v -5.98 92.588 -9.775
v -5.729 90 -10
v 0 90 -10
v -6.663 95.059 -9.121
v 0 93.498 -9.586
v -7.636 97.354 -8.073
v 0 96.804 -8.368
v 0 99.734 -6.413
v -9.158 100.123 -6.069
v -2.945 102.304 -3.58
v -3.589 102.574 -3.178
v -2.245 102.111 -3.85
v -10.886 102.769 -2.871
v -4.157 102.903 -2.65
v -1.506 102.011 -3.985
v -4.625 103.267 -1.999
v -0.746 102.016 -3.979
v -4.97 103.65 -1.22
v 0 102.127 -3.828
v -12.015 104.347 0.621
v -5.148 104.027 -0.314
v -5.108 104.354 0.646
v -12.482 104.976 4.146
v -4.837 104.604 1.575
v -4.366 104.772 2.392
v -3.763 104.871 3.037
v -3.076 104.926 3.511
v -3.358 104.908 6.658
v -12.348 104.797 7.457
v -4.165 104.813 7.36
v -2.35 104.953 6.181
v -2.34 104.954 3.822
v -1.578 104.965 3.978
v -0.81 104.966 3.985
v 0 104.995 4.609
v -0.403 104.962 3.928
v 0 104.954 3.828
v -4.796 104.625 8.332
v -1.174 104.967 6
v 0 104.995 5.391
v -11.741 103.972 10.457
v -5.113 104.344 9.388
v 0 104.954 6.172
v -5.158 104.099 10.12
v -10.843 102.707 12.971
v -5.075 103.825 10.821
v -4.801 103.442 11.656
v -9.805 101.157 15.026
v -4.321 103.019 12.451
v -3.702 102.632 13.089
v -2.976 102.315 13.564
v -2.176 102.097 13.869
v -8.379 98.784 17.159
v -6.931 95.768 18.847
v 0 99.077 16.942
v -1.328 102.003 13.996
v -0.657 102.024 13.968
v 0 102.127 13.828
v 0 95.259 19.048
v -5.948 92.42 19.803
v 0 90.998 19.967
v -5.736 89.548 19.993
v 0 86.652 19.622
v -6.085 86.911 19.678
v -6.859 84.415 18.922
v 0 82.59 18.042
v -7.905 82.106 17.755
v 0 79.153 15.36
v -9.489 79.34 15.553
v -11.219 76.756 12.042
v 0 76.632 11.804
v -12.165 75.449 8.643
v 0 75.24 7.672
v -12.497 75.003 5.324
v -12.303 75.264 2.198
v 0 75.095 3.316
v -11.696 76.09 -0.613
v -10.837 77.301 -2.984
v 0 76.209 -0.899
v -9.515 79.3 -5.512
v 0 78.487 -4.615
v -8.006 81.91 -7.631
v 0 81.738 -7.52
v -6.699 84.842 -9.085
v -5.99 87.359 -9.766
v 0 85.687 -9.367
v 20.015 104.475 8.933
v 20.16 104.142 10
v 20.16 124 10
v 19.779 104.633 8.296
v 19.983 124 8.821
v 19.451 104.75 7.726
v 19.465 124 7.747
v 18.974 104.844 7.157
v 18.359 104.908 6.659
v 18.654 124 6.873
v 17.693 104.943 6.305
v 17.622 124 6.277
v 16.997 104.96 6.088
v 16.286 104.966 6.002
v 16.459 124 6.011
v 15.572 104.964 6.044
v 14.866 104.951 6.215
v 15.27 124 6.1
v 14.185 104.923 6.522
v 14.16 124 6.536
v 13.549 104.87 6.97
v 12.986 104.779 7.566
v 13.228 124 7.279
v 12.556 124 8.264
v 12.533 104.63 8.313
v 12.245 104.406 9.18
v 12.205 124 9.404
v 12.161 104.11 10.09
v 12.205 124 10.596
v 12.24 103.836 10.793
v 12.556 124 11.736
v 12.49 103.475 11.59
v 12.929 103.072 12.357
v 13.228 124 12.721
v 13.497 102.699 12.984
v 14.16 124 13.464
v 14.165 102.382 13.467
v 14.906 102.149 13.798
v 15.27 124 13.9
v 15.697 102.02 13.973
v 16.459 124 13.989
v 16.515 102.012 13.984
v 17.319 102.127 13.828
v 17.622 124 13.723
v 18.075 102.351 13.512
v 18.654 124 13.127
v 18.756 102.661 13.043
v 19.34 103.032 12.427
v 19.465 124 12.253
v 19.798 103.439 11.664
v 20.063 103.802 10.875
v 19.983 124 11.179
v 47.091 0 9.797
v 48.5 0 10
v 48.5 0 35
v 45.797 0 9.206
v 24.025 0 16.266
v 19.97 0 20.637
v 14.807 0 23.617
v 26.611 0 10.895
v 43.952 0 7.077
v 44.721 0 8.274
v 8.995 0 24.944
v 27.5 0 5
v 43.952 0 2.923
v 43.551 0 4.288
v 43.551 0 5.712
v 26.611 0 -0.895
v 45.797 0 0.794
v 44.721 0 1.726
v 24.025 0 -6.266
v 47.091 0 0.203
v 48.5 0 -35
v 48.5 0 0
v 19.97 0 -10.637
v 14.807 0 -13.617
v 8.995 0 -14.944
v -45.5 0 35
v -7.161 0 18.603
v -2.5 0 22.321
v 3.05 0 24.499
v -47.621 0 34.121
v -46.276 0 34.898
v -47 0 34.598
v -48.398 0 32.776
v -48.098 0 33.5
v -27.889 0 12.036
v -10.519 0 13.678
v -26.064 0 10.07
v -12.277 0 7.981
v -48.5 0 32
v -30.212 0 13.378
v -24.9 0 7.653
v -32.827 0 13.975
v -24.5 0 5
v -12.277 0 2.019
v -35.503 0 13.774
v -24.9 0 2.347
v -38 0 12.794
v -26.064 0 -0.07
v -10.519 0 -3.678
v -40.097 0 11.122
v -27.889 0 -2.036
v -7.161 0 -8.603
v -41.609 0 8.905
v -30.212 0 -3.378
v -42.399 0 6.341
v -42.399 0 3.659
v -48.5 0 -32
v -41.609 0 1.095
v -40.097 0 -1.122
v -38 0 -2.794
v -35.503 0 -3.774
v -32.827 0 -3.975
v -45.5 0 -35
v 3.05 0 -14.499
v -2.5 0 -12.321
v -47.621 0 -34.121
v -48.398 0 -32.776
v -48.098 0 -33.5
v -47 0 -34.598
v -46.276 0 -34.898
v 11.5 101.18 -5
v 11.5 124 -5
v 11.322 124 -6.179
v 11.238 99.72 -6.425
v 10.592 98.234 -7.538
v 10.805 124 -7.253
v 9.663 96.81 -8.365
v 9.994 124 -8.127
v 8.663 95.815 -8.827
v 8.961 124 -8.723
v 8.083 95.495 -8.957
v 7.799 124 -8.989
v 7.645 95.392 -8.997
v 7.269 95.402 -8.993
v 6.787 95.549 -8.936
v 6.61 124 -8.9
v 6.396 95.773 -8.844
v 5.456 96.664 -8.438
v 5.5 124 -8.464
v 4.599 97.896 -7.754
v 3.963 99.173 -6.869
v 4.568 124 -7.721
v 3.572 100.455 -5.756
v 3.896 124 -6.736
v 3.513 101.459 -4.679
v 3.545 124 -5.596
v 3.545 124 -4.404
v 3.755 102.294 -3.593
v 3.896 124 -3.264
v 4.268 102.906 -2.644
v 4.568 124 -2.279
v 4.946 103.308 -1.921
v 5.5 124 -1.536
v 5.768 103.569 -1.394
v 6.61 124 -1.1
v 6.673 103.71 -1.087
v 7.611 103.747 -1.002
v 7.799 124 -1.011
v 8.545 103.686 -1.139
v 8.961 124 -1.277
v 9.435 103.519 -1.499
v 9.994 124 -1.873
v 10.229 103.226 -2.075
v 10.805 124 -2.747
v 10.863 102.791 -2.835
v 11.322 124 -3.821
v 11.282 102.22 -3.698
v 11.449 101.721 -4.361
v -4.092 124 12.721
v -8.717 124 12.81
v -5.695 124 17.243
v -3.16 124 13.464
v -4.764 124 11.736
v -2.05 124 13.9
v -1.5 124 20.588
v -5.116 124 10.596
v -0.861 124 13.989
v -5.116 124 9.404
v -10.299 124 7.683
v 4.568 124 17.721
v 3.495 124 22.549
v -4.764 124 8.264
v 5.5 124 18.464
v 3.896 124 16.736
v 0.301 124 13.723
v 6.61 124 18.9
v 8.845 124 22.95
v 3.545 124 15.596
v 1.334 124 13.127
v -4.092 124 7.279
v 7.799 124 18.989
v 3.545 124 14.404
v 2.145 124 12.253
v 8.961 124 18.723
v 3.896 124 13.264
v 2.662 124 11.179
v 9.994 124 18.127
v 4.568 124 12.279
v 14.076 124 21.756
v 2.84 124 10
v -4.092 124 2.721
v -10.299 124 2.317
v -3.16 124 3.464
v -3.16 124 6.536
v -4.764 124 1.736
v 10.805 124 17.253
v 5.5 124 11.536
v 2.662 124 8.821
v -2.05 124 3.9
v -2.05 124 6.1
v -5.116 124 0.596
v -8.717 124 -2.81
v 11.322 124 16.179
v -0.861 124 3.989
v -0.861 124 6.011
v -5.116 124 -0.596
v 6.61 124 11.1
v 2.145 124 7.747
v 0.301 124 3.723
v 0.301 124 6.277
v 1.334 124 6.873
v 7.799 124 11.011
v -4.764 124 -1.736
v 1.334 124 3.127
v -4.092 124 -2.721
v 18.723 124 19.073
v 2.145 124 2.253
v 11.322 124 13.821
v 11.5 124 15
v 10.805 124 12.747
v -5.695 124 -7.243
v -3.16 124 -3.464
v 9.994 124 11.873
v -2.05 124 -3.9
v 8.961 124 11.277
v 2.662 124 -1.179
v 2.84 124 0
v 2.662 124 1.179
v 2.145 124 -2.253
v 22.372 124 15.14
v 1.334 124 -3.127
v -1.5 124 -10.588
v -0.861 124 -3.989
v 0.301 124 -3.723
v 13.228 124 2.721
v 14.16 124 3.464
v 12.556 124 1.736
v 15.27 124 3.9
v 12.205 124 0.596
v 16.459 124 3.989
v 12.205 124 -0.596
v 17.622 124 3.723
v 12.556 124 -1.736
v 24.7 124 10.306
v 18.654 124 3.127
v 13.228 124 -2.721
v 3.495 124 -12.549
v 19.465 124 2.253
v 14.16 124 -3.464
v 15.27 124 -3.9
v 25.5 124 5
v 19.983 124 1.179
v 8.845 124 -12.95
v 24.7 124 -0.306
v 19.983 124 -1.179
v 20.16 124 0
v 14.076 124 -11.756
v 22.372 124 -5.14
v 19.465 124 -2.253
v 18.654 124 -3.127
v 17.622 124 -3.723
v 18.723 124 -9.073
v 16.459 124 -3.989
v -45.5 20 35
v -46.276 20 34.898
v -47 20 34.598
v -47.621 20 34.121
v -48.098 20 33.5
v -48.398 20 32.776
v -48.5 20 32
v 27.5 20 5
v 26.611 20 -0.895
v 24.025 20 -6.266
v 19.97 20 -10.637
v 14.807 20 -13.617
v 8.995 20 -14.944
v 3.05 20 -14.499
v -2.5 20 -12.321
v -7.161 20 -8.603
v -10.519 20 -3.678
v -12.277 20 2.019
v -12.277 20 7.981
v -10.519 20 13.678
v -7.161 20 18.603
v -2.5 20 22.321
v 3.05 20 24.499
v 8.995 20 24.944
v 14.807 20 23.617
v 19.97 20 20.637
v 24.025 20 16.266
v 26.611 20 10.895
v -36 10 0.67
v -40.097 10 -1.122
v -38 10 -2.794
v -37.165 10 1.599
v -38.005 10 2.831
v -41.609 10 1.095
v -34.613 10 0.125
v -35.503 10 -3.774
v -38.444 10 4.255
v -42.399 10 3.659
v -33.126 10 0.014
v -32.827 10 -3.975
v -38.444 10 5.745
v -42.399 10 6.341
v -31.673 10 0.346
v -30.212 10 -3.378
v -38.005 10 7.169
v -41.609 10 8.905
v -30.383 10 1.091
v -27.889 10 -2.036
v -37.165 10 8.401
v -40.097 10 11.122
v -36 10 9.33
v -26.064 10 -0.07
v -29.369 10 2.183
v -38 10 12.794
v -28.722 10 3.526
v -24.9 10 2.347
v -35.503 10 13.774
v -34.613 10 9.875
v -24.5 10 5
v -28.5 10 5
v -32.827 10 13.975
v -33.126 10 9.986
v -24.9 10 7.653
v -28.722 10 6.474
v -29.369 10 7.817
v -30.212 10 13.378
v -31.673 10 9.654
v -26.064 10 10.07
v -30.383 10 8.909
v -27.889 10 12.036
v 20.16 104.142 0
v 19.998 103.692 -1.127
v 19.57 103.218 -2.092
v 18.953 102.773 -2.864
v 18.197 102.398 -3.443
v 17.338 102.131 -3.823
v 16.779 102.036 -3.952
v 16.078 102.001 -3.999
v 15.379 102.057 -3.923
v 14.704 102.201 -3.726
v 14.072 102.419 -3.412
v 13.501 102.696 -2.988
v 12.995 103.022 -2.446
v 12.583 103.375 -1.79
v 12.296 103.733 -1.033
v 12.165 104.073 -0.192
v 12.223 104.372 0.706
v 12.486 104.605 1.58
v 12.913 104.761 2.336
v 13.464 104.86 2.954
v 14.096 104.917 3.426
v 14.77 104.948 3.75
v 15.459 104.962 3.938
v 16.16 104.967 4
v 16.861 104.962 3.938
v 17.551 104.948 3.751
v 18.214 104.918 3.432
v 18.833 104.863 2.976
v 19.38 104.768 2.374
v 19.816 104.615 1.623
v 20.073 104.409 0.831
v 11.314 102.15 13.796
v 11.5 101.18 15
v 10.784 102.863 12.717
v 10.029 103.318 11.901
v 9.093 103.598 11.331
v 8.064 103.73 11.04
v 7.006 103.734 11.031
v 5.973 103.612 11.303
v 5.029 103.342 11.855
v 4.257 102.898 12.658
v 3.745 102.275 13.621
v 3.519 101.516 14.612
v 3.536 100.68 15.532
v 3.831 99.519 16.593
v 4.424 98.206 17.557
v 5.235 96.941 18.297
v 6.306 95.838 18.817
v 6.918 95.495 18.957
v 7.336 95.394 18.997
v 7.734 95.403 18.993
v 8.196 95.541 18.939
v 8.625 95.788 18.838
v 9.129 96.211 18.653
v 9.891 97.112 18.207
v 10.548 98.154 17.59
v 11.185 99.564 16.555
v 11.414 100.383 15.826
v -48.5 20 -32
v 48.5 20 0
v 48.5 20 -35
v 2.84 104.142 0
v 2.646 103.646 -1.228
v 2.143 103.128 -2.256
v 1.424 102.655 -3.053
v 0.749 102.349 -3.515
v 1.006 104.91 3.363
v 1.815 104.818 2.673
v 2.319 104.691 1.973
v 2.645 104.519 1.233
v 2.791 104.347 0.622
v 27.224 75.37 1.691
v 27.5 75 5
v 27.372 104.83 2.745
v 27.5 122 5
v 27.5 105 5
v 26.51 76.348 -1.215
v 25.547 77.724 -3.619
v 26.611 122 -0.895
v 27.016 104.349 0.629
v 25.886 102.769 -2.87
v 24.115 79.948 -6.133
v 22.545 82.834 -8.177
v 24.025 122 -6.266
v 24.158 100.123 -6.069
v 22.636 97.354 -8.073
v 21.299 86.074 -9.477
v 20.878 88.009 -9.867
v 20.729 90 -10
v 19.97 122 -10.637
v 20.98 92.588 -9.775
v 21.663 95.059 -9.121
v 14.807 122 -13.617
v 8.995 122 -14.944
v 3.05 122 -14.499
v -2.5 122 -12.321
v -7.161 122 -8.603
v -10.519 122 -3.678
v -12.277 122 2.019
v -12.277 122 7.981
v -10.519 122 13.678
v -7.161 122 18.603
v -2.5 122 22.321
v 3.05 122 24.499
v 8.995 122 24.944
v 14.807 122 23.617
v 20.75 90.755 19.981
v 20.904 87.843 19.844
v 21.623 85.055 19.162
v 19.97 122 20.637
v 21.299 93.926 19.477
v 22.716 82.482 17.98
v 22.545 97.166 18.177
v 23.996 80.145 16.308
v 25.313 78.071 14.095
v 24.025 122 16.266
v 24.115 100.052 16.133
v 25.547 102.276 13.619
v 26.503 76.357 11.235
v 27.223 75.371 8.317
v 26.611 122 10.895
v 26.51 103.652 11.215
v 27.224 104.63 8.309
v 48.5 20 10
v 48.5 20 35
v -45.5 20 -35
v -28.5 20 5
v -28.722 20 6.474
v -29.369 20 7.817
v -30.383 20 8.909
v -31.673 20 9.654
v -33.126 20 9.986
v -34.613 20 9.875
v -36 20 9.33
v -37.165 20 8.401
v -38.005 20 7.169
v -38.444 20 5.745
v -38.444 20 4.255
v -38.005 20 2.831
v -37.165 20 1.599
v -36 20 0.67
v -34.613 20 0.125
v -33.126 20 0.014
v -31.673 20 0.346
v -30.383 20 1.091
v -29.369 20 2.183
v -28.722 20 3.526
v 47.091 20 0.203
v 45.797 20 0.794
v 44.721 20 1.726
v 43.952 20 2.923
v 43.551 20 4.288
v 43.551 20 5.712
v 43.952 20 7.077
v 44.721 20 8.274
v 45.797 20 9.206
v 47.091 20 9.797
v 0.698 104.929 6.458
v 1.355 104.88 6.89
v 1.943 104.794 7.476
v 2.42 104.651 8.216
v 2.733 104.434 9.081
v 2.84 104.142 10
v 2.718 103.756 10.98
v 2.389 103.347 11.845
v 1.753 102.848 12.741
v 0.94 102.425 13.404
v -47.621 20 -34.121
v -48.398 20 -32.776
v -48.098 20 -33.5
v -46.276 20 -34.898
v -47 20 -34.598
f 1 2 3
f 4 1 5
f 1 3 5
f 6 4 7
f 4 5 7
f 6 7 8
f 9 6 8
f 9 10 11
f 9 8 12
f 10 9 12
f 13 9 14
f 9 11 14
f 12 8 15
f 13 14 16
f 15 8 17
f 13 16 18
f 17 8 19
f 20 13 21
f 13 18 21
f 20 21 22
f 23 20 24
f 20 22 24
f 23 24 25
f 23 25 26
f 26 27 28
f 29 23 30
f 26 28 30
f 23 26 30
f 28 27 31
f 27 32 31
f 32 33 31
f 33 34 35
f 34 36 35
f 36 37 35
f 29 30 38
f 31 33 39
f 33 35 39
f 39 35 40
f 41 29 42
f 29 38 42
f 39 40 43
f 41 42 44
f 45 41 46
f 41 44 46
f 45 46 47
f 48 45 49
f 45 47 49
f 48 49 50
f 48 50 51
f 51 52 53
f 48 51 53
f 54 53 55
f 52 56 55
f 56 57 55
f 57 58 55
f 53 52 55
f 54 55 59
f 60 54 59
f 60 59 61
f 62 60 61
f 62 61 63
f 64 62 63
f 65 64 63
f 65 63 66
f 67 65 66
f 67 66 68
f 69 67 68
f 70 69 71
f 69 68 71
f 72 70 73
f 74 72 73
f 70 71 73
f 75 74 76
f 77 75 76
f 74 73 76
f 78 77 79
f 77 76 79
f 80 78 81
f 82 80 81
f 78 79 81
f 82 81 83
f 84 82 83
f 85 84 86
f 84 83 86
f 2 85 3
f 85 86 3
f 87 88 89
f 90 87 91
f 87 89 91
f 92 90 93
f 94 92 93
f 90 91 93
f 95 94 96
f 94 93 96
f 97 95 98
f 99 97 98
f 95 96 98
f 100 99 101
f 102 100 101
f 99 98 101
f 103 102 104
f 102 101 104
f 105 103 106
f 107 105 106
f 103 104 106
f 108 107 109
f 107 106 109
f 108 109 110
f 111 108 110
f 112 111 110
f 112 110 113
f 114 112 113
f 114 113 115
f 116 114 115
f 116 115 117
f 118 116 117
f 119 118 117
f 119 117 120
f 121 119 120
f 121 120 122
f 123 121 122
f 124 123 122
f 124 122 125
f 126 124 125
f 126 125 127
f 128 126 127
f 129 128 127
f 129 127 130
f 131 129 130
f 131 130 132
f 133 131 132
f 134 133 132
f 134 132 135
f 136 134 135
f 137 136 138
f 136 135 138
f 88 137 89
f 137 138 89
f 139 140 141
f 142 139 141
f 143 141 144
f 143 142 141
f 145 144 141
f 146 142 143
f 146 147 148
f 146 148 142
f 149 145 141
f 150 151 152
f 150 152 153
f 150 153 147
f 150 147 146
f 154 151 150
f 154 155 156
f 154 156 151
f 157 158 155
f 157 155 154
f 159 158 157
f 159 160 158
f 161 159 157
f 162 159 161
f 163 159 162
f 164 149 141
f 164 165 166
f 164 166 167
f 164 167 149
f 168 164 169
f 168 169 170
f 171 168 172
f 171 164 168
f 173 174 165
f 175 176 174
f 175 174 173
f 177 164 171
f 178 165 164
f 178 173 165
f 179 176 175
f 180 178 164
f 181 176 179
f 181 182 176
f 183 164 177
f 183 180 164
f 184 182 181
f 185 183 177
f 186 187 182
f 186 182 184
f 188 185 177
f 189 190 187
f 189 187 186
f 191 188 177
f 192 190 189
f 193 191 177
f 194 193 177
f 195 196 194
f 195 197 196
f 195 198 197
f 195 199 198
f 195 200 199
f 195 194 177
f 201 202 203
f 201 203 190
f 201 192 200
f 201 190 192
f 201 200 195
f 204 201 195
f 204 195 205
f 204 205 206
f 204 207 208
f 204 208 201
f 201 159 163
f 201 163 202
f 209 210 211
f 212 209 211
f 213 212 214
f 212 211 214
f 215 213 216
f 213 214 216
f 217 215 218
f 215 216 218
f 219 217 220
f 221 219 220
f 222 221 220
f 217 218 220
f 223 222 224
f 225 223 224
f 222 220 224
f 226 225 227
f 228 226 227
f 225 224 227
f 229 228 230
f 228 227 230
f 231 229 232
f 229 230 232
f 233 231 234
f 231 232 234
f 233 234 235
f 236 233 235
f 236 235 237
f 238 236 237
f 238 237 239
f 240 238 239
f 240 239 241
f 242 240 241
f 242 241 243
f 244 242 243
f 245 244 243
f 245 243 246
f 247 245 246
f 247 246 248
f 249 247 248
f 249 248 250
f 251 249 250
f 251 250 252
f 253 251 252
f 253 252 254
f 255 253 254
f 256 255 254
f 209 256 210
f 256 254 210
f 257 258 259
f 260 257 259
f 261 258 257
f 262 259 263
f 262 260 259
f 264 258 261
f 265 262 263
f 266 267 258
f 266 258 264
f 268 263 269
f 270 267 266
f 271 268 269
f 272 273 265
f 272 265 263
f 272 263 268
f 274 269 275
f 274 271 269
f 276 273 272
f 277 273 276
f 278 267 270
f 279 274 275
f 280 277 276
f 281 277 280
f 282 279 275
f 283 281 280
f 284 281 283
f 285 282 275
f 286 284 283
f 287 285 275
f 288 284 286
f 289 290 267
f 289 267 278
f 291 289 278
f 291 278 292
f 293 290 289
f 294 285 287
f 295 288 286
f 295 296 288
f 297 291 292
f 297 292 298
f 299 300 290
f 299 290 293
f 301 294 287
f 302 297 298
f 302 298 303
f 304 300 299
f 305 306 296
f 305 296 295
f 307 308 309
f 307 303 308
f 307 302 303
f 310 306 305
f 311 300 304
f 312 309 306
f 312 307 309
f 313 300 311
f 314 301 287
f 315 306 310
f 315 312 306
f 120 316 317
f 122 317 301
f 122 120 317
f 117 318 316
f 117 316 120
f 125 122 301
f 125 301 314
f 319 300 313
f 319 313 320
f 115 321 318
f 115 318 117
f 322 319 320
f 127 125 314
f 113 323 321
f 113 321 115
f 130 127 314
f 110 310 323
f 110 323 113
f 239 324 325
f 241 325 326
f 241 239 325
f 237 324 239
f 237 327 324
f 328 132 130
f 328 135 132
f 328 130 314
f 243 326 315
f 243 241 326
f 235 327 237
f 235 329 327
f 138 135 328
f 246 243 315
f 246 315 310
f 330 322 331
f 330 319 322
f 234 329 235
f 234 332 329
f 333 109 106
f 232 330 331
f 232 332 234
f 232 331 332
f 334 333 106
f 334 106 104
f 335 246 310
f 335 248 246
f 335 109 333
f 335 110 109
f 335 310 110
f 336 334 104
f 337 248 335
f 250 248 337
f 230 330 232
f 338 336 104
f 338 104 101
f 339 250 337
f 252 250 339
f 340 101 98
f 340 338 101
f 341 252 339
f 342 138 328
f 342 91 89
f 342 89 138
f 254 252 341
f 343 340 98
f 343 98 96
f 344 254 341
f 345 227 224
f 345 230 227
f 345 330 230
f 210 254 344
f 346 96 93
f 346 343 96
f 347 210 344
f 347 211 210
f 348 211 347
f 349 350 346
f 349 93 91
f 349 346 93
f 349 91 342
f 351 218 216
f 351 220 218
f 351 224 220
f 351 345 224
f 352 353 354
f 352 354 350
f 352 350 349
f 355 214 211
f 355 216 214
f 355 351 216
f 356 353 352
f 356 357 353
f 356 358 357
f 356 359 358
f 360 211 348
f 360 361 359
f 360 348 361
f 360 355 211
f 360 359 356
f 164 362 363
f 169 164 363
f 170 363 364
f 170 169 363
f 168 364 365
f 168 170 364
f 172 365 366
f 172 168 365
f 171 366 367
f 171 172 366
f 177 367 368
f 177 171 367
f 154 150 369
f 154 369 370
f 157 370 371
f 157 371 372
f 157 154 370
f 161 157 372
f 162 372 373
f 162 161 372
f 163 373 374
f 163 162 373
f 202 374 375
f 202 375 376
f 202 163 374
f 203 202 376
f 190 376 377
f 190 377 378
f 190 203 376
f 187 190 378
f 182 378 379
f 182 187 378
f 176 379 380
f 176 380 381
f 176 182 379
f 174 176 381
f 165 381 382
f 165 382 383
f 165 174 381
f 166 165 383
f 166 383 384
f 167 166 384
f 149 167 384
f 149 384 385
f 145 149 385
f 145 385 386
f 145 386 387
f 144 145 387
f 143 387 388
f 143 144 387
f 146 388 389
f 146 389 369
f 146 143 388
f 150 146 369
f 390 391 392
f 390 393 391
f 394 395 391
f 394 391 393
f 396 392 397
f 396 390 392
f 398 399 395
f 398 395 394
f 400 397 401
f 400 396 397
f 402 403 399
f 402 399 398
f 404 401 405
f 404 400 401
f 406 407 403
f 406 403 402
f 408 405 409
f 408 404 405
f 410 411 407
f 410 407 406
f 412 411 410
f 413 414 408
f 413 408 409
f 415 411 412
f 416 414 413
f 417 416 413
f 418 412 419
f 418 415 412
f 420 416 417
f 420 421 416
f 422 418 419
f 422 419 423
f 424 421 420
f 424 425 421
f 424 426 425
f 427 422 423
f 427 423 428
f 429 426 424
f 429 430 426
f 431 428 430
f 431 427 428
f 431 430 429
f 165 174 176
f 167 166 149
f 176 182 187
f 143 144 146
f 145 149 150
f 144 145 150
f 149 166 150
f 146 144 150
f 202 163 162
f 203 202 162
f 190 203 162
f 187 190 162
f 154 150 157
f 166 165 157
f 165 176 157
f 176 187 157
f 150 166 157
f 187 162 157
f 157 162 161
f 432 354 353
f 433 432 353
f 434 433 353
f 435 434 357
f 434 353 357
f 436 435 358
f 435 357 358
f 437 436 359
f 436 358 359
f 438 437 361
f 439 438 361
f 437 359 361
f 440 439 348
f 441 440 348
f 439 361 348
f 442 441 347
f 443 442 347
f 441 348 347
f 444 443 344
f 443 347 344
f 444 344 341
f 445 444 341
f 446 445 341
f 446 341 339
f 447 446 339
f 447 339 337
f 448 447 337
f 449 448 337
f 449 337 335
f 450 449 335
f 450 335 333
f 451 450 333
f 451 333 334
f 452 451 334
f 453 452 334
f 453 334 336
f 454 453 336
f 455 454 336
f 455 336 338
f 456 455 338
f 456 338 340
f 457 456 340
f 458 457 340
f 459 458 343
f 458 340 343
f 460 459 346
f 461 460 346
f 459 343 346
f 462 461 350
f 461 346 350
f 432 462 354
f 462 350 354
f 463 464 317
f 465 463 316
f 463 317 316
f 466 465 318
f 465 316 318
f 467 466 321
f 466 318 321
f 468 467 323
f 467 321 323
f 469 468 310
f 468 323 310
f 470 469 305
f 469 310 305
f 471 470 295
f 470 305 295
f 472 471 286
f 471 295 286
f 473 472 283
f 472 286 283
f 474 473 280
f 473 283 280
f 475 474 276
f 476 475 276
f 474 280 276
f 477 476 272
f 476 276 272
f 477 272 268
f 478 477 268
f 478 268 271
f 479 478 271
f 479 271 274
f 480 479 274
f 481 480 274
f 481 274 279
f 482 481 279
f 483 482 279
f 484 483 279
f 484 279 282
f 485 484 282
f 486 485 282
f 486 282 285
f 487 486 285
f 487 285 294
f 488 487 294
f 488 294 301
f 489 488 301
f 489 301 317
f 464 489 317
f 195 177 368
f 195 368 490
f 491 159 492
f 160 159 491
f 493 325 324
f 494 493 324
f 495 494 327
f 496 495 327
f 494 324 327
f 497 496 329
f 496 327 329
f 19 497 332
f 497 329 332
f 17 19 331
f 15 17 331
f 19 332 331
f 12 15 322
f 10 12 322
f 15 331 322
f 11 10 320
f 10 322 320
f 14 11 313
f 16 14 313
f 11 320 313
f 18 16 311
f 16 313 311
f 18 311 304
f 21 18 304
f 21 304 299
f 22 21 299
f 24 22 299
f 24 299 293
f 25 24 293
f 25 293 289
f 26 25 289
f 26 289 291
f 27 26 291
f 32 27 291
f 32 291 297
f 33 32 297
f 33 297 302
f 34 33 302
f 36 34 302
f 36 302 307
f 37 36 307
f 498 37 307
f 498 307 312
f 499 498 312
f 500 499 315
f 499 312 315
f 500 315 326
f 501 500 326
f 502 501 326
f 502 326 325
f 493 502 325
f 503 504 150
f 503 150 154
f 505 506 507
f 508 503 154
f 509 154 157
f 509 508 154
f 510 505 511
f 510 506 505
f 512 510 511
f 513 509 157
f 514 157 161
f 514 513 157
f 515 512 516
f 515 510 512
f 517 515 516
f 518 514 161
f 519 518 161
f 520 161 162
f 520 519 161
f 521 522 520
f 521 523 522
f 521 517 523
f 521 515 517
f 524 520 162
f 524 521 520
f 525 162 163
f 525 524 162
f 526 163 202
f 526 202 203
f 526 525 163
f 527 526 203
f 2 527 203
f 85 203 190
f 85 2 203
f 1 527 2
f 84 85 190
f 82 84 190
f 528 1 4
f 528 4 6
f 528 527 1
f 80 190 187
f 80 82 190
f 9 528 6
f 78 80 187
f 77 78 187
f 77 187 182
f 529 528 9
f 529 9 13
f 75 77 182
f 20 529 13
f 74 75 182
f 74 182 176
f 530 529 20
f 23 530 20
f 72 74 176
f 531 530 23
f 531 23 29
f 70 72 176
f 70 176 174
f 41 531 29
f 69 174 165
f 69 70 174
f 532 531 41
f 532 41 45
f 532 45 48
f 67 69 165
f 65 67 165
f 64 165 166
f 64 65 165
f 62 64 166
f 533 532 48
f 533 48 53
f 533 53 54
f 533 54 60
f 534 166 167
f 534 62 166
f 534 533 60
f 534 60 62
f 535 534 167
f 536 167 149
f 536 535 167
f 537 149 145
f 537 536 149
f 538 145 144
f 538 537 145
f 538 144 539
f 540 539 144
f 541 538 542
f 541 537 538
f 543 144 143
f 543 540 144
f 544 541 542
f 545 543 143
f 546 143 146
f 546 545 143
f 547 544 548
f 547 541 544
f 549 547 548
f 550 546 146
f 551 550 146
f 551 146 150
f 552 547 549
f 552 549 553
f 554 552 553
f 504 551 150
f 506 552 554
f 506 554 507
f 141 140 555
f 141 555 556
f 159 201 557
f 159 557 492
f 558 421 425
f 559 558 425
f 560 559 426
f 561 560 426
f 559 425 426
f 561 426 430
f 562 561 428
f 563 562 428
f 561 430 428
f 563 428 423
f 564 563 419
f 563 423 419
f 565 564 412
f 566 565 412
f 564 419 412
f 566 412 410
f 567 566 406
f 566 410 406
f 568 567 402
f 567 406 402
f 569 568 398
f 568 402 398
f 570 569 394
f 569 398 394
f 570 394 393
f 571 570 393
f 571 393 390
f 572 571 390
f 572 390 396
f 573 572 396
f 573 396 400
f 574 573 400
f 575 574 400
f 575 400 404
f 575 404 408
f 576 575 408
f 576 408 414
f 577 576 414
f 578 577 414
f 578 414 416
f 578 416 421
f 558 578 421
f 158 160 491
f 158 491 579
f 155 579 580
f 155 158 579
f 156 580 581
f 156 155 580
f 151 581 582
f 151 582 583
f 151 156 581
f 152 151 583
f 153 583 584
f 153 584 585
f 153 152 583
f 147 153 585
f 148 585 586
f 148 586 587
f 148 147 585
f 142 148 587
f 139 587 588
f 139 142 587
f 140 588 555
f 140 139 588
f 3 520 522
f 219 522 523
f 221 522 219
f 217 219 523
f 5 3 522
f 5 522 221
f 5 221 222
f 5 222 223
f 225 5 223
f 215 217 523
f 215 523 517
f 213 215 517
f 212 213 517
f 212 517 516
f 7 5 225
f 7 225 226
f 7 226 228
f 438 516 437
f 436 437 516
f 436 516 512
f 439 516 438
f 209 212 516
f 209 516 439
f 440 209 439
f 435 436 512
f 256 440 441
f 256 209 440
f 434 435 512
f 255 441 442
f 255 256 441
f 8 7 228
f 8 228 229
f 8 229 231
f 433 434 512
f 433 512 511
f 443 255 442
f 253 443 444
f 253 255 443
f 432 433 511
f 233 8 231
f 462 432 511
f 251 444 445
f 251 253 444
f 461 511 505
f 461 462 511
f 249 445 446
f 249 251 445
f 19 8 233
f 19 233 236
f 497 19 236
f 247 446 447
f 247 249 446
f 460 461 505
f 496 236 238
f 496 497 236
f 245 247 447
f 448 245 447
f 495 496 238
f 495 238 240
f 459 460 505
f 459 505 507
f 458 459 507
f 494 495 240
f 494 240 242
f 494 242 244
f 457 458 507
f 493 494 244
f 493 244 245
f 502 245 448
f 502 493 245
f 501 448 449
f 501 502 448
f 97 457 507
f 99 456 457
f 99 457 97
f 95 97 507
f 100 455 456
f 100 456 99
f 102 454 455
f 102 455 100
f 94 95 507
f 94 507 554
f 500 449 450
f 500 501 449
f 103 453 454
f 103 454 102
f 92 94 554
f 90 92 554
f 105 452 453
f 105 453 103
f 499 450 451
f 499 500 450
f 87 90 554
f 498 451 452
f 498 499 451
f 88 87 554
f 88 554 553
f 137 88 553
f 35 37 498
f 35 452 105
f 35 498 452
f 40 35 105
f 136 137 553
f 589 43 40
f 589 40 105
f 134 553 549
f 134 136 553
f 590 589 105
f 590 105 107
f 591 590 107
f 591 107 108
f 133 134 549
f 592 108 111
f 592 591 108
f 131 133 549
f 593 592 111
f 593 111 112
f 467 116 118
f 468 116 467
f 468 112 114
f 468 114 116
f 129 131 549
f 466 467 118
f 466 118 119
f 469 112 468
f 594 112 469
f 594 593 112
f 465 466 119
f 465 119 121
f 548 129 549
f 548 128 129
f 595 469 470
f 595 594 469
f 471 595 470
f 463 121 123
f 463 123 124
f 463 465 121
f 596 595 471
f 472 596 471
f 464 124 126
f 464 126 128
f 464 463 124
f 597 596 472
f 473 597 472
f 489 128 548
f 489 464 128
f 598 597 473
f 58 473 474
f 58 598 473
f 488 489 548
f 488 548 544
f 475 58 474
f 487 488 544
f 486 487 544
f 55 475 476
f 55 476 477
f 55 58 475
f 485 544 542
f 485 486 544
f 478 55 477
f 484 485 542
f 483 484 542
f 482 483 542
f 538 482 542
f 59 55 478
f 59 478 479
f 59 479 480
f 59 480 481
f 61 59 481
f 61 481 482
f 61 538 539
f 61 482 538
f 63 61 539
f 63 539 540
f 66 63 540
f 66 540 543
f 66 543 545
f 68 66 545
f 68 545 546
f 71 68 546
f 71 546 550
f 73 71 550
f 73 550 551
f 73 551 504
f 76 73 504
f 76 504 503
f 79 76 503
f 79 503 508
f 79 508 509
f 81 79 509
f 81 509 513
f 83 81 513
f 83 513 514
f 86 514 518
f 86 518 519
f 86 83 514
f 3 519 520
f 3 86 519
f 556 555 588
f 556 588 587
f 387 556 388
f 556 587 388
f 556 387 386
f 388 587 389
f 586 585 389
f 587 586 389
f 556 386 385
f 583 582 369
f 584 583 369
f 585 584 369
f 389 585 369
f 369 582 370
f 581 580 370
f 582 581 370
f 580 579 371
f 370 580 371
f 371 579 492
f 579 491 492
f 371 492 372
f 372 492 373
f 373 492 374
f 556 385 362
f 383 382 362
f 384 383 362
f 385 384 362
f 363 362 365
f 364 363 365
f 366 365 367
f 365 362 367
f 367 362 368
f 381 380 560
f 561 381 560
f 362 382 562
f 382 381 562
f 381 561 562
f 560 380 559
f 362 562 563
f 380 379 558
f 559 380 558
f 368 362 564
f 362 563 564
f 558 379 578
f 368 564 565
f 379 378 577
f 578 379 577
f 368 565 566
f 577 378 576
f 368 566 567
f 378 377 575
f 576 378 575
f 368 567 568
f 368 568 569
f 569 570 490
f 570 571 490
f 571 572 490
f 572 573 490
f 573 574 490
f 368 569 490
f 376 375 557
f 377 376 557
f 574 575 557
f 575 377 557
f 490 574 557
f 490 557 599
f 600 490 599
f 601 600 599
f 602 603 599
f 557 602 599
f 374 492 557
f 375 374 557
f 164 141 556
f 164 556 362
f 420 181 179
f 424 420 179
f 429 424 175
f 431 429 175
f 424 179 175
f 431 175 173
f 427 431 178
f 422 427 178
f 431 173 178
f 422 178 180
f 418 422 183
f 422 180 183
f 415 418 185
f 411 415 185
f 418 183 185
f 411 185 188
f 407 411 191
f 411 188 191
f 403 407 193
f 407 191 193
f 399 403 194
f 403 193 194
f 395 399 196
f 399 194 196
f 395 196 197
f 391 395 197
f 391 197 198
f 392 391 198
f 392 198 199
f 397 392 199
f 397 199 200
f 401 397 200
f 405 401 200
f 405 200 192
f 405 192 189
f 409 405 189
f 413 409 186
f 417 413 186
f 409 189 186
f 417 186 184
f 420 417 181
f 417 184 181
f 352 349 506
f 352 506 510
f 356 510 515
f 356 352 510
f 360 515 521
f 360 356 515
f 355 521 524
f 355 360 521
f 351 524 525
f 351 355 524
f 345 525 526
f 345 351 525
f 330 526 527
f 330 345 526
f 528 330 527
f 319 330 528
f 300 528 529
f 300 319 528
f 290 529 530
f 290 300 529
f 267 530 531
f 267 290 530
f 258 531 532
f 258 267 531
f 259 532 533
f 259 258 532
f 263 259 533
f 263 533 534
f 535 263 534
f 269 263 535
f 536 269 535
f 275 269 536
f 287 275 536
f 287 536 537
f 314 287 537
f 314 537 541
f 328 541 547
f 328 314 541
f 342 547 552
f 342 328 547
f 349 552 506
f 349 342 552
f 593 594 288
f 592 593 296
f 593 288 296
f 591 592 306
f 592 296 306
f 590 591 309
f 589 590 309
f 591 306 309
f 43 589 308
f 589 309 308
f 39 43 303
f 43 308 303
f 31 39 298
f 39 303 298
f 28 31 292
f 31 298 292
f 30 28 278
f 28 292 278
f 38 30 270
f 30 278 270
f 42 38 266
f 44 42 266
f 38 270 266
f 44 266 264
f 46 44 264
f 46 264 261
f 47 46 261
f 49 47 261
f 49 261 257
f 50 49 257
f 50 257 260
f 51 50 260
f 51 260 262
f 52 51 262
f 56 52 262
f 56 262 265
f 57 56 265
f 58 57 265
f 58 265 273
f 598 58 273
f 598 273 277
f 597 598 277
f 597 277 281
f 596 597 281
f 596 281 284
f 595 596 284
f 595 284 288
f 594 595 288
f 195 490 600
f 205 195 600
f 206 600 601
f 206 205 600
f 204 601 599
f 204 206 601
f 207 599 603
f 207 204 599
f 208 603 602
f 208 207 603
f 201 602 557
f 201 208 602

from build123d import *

# Parameters (mm, degrees)
SKETCH1_R                = 20
BOSS_EXTRUDE1_DEPTH      = 20
SKETCH2_R                = 5
CUT_EXTRUDE1_DEPTH       = 21
SKETCH3_R                = 9
CUT_EXTRUDE2_DEPTH       = 10
SKETCH4_R                = 20
BOSS_EXTRUDE2_DEPTH      = 104
BOSS_EXTRUDE2_DEPTH_BACK = 20
SKETCH5_R                = 15
CUT_EXTRUDE3_DEPTH       = 49.5
CUT_EXTRUDE3_DEPTH_BACK  = 49.5
CHAMFER1_SIZE            = 2
CUT_EXTRUDE4_REACH       = 126
SKETCH6_R                = 4


with BuildPart() as part:
    # Sketch1 → Boss-Extrude1 (new body)
    with BuildSketch(Plane(origin=(0, 0, 0), x_dir=(1, 0, 0), z_dir=(0, 1, 0))):
        with BuildLine():
            Line((-45.5, 35), (48.5, 35))
            Line((48.5, 35), (48.5, 0))
            ThreePointArc((48.5, 0), (43.5, -5), (48.5, -10))
            Line((48.5, -10), (48.5, -35))
            Line((48.5, -35), (-45.5, -35))
            ThreePointArc((-45.5, -35), (-47.621320344, -34.121320344), (-48.5, -32))
            Line((-48.5, -32), (-48.5, 32))
            ThreePointArc((-48.5, 32), (-47.621320344, 34.121320344), (-45.5, 35))
        make_face()
        with Locations((7.5, -5)):
            Circle(SKETCH1_R, mode=Mode.SUBTRACT)
    extrude(amount=BOSS_EXTRUDE1_DEPTH)

    # Sketch2 → Cut-Extrude1 (cut, through all)
    with BuildSketch(Plane.XZ):
        with Locations((-33.5, 5)):
            Circle(SKETCH2_R)
    extrude(amount=-CUT_EXTRUDE1_DEPTH, mode=Mode.SUBTRACT)

    # Sketch3 → Cut-Extrude2 (cut)
    with BuildSketch(Plane.XZ):
        with Locations((-33.5, 5)):
            Circle(SKETCH3_R)
    extrude(amount=-CUT_EXTRUDE2_DEPTH, mode=Mode.SUBTRACT)


with BuildPart() as body_2:
    # Sketch4 → Boss-Extrude2 (new body, two sides)
    with BuildSketch(Plane(origin=(0, 20, 0), x_dir=(1, 0, 0), z_dir=(0, 1, 0))) as boss_extrude2_sk:
        with Locations((7.5, -5)):
            Circle(SKETCH4_R)
    extrude(amount=BOSS_EXTRUDE2_DEPTH)
    extrude(boss_extrude2_sk.sketch, amount=-BOSS_EXTRUDE2_DEPTH_BACK)

    # Sketch5 → Cut-Extrude3 (cut, two sides)
    with BuildSketch(Plane(origin=(0, 0, 0), x_dir=(0, 0, -1), z_dir=(1, 0, 0))) as cut_extrude3_sk:
        with Locations((-5, 90)):
            Circle(SKETCH5_R)
    extrude(amount=CUT_EXTRUDE3_DEPTH, mode=Mode.SUBTRACT)
    extrude(cut_extrude3_sk.sketch, amount=-CUT_EXTRUDE3_DEPTH_BACK, mode=Mode.SUBTRACT)

    # Chamfer1
    chamfer1_edges = [body_2.edges().sort_by_distance(p)[0] for p in [
        (-12.5, 124, 5),
    ]]
    chamfer(chamfer1_edges, length=CHAMFER1_SIZE)

    # Sketch6 → Cut-Extrude4 (cut, up to next)
    with BuildSketch(Plane(origin=(0, 124, 0), x_dir=(1, 0, 0), z_dir=(0, 1, 0)), mode=Mode.PRIVATE) as cut_extrude4_sk1:
        with Locations((7.5, 5)):
            Circle(SKETCH6_R)
    cut_extrude4_tool1 = extrude(cut_extrude4_sk1.sketch, amount=-CUT_EXTRUDE4_REACH, mode=Mode.PRIVATE) & body_2.part
    add(cut_extrude4_tool1.solids().sort_by_distance((7.5, 124, -5))[0], mode=Mode.SUBTRACT)
    # Sketch6 → Cut-Extrude4 (cut, up to next)
    with BuildSketch(Plane(origin=(0, 124, 0), x_dir=(1, 0, 0), z_dir=(0, 1, 0)), mode=Mode.PRIVATE) as cut_extrude4_sk2:
        with Locations((16.160254038, 0)):
            Circle(SKETCH6_R)
    cut_extrude4_tool2 = extrude(cut_extrude4_sk2.sketch, amount=-CUT_EXTRUDE4_REACH, mode=Mode.PRIVATE) & body_2.part
    add(cut_extrude4_tool2.solids().sort_by_distance((16.160254, 124, 0))[0], mode=Mode.SUBTRACT)
    # Sketch6 → Cut-Extrude4 (cut, up to next)
    with BuildSketch(Plane(origin=(0, 124, 0), x_dir=(1, 0, 0), z_dir=(0, 1, 0)), mode=Mode.PRIVATE) as cut_extrude4_sk3:
        with Locations((16.160254038, -10)):
            Circle(SKETCH6_R)
    cut_extrude4_tool3 = extrude(cut_extrude4_sk3.sketch, amount=-CUT_EXTRUDE4_REACH, mode=Mode.PRIVATE) & body_2.part
    add(cut_extrude4_tool3.solids().sort_by_distance((16.160254, 124, 10))[0], mode=Mode.SUBTRACT)
    # Sketch6 → Cut-Extrude4 (cut, up to next)
    with BuildSketch(Plane(origin=(0, 124, 0), x_dir=(1, 0, 0), z_dir=(0, 1, 0)), mode=Mode.PRIVATE) as cut_extrude4_sk4:
        with Locations((7.5, -15)):
            Circle(SKETCH6_R)
    cut_extrude4_tool4 = extrude(cut_extrude4_sk4.sketch, amount=-CUT_EXTRUDE4_REACH, mode=Mode.PRIVATE) & body_2.part
    add(cut_extrude4_tool4.solids().sort_by_distance((7.5, 124, 15))[0], mode=Mode.SUBTRACT)
    # Sketch6 → Cut-Extrude4 (cut, up to next)
    with BuildSketch(Plane(origin=(0, 124, 0), x_dir=(1, 0, 0), z_dir=(0, 1, 0)), mode=Mode.PRIVATE) as cut_extrude4_sk5:
        with Locations((-1.160254038, -10)):
            Circle(SKETCH6_R)
    cut_extrude4_tool5 = extrude(cut_extrude4_sk5.sketch, amount=-CUT_EXTRUDE4_REACH, mode=Mode.PRIVATE) & body_2.part
    add(cut_extrude4_tool5.solids().sort_by_distance((-1.160254, 124, 10))[0], mode=Mode.SUBTRACT)
    # Sketch6 → Cut-Extrude4 (cut, up to next)
    with BuildSketch(Plane(origin=(0, 124, 0), x_dir=(1, 0, 0), z_dir=(0, 1, 0)), mode=Mode.PRIVATE) as cut_extrude4_sk6:
        with Locations((-1.160254038, 0)):
            Circle(SKETCH6_R)
    cut_extrude4_tool6 = extrude(cut_extrude4_sk6.sketch, amount=-CUT_EXTRUDE4_REACH, mode=Mode.PRIVATE) & body_2.part
    add(cut_extrude4_tool6.solids().sort_by_distance((-1.160254, 124, 0))[0], mode=Mode.SUBTRACT)


solid = Compound([part.part, body_2.part])
